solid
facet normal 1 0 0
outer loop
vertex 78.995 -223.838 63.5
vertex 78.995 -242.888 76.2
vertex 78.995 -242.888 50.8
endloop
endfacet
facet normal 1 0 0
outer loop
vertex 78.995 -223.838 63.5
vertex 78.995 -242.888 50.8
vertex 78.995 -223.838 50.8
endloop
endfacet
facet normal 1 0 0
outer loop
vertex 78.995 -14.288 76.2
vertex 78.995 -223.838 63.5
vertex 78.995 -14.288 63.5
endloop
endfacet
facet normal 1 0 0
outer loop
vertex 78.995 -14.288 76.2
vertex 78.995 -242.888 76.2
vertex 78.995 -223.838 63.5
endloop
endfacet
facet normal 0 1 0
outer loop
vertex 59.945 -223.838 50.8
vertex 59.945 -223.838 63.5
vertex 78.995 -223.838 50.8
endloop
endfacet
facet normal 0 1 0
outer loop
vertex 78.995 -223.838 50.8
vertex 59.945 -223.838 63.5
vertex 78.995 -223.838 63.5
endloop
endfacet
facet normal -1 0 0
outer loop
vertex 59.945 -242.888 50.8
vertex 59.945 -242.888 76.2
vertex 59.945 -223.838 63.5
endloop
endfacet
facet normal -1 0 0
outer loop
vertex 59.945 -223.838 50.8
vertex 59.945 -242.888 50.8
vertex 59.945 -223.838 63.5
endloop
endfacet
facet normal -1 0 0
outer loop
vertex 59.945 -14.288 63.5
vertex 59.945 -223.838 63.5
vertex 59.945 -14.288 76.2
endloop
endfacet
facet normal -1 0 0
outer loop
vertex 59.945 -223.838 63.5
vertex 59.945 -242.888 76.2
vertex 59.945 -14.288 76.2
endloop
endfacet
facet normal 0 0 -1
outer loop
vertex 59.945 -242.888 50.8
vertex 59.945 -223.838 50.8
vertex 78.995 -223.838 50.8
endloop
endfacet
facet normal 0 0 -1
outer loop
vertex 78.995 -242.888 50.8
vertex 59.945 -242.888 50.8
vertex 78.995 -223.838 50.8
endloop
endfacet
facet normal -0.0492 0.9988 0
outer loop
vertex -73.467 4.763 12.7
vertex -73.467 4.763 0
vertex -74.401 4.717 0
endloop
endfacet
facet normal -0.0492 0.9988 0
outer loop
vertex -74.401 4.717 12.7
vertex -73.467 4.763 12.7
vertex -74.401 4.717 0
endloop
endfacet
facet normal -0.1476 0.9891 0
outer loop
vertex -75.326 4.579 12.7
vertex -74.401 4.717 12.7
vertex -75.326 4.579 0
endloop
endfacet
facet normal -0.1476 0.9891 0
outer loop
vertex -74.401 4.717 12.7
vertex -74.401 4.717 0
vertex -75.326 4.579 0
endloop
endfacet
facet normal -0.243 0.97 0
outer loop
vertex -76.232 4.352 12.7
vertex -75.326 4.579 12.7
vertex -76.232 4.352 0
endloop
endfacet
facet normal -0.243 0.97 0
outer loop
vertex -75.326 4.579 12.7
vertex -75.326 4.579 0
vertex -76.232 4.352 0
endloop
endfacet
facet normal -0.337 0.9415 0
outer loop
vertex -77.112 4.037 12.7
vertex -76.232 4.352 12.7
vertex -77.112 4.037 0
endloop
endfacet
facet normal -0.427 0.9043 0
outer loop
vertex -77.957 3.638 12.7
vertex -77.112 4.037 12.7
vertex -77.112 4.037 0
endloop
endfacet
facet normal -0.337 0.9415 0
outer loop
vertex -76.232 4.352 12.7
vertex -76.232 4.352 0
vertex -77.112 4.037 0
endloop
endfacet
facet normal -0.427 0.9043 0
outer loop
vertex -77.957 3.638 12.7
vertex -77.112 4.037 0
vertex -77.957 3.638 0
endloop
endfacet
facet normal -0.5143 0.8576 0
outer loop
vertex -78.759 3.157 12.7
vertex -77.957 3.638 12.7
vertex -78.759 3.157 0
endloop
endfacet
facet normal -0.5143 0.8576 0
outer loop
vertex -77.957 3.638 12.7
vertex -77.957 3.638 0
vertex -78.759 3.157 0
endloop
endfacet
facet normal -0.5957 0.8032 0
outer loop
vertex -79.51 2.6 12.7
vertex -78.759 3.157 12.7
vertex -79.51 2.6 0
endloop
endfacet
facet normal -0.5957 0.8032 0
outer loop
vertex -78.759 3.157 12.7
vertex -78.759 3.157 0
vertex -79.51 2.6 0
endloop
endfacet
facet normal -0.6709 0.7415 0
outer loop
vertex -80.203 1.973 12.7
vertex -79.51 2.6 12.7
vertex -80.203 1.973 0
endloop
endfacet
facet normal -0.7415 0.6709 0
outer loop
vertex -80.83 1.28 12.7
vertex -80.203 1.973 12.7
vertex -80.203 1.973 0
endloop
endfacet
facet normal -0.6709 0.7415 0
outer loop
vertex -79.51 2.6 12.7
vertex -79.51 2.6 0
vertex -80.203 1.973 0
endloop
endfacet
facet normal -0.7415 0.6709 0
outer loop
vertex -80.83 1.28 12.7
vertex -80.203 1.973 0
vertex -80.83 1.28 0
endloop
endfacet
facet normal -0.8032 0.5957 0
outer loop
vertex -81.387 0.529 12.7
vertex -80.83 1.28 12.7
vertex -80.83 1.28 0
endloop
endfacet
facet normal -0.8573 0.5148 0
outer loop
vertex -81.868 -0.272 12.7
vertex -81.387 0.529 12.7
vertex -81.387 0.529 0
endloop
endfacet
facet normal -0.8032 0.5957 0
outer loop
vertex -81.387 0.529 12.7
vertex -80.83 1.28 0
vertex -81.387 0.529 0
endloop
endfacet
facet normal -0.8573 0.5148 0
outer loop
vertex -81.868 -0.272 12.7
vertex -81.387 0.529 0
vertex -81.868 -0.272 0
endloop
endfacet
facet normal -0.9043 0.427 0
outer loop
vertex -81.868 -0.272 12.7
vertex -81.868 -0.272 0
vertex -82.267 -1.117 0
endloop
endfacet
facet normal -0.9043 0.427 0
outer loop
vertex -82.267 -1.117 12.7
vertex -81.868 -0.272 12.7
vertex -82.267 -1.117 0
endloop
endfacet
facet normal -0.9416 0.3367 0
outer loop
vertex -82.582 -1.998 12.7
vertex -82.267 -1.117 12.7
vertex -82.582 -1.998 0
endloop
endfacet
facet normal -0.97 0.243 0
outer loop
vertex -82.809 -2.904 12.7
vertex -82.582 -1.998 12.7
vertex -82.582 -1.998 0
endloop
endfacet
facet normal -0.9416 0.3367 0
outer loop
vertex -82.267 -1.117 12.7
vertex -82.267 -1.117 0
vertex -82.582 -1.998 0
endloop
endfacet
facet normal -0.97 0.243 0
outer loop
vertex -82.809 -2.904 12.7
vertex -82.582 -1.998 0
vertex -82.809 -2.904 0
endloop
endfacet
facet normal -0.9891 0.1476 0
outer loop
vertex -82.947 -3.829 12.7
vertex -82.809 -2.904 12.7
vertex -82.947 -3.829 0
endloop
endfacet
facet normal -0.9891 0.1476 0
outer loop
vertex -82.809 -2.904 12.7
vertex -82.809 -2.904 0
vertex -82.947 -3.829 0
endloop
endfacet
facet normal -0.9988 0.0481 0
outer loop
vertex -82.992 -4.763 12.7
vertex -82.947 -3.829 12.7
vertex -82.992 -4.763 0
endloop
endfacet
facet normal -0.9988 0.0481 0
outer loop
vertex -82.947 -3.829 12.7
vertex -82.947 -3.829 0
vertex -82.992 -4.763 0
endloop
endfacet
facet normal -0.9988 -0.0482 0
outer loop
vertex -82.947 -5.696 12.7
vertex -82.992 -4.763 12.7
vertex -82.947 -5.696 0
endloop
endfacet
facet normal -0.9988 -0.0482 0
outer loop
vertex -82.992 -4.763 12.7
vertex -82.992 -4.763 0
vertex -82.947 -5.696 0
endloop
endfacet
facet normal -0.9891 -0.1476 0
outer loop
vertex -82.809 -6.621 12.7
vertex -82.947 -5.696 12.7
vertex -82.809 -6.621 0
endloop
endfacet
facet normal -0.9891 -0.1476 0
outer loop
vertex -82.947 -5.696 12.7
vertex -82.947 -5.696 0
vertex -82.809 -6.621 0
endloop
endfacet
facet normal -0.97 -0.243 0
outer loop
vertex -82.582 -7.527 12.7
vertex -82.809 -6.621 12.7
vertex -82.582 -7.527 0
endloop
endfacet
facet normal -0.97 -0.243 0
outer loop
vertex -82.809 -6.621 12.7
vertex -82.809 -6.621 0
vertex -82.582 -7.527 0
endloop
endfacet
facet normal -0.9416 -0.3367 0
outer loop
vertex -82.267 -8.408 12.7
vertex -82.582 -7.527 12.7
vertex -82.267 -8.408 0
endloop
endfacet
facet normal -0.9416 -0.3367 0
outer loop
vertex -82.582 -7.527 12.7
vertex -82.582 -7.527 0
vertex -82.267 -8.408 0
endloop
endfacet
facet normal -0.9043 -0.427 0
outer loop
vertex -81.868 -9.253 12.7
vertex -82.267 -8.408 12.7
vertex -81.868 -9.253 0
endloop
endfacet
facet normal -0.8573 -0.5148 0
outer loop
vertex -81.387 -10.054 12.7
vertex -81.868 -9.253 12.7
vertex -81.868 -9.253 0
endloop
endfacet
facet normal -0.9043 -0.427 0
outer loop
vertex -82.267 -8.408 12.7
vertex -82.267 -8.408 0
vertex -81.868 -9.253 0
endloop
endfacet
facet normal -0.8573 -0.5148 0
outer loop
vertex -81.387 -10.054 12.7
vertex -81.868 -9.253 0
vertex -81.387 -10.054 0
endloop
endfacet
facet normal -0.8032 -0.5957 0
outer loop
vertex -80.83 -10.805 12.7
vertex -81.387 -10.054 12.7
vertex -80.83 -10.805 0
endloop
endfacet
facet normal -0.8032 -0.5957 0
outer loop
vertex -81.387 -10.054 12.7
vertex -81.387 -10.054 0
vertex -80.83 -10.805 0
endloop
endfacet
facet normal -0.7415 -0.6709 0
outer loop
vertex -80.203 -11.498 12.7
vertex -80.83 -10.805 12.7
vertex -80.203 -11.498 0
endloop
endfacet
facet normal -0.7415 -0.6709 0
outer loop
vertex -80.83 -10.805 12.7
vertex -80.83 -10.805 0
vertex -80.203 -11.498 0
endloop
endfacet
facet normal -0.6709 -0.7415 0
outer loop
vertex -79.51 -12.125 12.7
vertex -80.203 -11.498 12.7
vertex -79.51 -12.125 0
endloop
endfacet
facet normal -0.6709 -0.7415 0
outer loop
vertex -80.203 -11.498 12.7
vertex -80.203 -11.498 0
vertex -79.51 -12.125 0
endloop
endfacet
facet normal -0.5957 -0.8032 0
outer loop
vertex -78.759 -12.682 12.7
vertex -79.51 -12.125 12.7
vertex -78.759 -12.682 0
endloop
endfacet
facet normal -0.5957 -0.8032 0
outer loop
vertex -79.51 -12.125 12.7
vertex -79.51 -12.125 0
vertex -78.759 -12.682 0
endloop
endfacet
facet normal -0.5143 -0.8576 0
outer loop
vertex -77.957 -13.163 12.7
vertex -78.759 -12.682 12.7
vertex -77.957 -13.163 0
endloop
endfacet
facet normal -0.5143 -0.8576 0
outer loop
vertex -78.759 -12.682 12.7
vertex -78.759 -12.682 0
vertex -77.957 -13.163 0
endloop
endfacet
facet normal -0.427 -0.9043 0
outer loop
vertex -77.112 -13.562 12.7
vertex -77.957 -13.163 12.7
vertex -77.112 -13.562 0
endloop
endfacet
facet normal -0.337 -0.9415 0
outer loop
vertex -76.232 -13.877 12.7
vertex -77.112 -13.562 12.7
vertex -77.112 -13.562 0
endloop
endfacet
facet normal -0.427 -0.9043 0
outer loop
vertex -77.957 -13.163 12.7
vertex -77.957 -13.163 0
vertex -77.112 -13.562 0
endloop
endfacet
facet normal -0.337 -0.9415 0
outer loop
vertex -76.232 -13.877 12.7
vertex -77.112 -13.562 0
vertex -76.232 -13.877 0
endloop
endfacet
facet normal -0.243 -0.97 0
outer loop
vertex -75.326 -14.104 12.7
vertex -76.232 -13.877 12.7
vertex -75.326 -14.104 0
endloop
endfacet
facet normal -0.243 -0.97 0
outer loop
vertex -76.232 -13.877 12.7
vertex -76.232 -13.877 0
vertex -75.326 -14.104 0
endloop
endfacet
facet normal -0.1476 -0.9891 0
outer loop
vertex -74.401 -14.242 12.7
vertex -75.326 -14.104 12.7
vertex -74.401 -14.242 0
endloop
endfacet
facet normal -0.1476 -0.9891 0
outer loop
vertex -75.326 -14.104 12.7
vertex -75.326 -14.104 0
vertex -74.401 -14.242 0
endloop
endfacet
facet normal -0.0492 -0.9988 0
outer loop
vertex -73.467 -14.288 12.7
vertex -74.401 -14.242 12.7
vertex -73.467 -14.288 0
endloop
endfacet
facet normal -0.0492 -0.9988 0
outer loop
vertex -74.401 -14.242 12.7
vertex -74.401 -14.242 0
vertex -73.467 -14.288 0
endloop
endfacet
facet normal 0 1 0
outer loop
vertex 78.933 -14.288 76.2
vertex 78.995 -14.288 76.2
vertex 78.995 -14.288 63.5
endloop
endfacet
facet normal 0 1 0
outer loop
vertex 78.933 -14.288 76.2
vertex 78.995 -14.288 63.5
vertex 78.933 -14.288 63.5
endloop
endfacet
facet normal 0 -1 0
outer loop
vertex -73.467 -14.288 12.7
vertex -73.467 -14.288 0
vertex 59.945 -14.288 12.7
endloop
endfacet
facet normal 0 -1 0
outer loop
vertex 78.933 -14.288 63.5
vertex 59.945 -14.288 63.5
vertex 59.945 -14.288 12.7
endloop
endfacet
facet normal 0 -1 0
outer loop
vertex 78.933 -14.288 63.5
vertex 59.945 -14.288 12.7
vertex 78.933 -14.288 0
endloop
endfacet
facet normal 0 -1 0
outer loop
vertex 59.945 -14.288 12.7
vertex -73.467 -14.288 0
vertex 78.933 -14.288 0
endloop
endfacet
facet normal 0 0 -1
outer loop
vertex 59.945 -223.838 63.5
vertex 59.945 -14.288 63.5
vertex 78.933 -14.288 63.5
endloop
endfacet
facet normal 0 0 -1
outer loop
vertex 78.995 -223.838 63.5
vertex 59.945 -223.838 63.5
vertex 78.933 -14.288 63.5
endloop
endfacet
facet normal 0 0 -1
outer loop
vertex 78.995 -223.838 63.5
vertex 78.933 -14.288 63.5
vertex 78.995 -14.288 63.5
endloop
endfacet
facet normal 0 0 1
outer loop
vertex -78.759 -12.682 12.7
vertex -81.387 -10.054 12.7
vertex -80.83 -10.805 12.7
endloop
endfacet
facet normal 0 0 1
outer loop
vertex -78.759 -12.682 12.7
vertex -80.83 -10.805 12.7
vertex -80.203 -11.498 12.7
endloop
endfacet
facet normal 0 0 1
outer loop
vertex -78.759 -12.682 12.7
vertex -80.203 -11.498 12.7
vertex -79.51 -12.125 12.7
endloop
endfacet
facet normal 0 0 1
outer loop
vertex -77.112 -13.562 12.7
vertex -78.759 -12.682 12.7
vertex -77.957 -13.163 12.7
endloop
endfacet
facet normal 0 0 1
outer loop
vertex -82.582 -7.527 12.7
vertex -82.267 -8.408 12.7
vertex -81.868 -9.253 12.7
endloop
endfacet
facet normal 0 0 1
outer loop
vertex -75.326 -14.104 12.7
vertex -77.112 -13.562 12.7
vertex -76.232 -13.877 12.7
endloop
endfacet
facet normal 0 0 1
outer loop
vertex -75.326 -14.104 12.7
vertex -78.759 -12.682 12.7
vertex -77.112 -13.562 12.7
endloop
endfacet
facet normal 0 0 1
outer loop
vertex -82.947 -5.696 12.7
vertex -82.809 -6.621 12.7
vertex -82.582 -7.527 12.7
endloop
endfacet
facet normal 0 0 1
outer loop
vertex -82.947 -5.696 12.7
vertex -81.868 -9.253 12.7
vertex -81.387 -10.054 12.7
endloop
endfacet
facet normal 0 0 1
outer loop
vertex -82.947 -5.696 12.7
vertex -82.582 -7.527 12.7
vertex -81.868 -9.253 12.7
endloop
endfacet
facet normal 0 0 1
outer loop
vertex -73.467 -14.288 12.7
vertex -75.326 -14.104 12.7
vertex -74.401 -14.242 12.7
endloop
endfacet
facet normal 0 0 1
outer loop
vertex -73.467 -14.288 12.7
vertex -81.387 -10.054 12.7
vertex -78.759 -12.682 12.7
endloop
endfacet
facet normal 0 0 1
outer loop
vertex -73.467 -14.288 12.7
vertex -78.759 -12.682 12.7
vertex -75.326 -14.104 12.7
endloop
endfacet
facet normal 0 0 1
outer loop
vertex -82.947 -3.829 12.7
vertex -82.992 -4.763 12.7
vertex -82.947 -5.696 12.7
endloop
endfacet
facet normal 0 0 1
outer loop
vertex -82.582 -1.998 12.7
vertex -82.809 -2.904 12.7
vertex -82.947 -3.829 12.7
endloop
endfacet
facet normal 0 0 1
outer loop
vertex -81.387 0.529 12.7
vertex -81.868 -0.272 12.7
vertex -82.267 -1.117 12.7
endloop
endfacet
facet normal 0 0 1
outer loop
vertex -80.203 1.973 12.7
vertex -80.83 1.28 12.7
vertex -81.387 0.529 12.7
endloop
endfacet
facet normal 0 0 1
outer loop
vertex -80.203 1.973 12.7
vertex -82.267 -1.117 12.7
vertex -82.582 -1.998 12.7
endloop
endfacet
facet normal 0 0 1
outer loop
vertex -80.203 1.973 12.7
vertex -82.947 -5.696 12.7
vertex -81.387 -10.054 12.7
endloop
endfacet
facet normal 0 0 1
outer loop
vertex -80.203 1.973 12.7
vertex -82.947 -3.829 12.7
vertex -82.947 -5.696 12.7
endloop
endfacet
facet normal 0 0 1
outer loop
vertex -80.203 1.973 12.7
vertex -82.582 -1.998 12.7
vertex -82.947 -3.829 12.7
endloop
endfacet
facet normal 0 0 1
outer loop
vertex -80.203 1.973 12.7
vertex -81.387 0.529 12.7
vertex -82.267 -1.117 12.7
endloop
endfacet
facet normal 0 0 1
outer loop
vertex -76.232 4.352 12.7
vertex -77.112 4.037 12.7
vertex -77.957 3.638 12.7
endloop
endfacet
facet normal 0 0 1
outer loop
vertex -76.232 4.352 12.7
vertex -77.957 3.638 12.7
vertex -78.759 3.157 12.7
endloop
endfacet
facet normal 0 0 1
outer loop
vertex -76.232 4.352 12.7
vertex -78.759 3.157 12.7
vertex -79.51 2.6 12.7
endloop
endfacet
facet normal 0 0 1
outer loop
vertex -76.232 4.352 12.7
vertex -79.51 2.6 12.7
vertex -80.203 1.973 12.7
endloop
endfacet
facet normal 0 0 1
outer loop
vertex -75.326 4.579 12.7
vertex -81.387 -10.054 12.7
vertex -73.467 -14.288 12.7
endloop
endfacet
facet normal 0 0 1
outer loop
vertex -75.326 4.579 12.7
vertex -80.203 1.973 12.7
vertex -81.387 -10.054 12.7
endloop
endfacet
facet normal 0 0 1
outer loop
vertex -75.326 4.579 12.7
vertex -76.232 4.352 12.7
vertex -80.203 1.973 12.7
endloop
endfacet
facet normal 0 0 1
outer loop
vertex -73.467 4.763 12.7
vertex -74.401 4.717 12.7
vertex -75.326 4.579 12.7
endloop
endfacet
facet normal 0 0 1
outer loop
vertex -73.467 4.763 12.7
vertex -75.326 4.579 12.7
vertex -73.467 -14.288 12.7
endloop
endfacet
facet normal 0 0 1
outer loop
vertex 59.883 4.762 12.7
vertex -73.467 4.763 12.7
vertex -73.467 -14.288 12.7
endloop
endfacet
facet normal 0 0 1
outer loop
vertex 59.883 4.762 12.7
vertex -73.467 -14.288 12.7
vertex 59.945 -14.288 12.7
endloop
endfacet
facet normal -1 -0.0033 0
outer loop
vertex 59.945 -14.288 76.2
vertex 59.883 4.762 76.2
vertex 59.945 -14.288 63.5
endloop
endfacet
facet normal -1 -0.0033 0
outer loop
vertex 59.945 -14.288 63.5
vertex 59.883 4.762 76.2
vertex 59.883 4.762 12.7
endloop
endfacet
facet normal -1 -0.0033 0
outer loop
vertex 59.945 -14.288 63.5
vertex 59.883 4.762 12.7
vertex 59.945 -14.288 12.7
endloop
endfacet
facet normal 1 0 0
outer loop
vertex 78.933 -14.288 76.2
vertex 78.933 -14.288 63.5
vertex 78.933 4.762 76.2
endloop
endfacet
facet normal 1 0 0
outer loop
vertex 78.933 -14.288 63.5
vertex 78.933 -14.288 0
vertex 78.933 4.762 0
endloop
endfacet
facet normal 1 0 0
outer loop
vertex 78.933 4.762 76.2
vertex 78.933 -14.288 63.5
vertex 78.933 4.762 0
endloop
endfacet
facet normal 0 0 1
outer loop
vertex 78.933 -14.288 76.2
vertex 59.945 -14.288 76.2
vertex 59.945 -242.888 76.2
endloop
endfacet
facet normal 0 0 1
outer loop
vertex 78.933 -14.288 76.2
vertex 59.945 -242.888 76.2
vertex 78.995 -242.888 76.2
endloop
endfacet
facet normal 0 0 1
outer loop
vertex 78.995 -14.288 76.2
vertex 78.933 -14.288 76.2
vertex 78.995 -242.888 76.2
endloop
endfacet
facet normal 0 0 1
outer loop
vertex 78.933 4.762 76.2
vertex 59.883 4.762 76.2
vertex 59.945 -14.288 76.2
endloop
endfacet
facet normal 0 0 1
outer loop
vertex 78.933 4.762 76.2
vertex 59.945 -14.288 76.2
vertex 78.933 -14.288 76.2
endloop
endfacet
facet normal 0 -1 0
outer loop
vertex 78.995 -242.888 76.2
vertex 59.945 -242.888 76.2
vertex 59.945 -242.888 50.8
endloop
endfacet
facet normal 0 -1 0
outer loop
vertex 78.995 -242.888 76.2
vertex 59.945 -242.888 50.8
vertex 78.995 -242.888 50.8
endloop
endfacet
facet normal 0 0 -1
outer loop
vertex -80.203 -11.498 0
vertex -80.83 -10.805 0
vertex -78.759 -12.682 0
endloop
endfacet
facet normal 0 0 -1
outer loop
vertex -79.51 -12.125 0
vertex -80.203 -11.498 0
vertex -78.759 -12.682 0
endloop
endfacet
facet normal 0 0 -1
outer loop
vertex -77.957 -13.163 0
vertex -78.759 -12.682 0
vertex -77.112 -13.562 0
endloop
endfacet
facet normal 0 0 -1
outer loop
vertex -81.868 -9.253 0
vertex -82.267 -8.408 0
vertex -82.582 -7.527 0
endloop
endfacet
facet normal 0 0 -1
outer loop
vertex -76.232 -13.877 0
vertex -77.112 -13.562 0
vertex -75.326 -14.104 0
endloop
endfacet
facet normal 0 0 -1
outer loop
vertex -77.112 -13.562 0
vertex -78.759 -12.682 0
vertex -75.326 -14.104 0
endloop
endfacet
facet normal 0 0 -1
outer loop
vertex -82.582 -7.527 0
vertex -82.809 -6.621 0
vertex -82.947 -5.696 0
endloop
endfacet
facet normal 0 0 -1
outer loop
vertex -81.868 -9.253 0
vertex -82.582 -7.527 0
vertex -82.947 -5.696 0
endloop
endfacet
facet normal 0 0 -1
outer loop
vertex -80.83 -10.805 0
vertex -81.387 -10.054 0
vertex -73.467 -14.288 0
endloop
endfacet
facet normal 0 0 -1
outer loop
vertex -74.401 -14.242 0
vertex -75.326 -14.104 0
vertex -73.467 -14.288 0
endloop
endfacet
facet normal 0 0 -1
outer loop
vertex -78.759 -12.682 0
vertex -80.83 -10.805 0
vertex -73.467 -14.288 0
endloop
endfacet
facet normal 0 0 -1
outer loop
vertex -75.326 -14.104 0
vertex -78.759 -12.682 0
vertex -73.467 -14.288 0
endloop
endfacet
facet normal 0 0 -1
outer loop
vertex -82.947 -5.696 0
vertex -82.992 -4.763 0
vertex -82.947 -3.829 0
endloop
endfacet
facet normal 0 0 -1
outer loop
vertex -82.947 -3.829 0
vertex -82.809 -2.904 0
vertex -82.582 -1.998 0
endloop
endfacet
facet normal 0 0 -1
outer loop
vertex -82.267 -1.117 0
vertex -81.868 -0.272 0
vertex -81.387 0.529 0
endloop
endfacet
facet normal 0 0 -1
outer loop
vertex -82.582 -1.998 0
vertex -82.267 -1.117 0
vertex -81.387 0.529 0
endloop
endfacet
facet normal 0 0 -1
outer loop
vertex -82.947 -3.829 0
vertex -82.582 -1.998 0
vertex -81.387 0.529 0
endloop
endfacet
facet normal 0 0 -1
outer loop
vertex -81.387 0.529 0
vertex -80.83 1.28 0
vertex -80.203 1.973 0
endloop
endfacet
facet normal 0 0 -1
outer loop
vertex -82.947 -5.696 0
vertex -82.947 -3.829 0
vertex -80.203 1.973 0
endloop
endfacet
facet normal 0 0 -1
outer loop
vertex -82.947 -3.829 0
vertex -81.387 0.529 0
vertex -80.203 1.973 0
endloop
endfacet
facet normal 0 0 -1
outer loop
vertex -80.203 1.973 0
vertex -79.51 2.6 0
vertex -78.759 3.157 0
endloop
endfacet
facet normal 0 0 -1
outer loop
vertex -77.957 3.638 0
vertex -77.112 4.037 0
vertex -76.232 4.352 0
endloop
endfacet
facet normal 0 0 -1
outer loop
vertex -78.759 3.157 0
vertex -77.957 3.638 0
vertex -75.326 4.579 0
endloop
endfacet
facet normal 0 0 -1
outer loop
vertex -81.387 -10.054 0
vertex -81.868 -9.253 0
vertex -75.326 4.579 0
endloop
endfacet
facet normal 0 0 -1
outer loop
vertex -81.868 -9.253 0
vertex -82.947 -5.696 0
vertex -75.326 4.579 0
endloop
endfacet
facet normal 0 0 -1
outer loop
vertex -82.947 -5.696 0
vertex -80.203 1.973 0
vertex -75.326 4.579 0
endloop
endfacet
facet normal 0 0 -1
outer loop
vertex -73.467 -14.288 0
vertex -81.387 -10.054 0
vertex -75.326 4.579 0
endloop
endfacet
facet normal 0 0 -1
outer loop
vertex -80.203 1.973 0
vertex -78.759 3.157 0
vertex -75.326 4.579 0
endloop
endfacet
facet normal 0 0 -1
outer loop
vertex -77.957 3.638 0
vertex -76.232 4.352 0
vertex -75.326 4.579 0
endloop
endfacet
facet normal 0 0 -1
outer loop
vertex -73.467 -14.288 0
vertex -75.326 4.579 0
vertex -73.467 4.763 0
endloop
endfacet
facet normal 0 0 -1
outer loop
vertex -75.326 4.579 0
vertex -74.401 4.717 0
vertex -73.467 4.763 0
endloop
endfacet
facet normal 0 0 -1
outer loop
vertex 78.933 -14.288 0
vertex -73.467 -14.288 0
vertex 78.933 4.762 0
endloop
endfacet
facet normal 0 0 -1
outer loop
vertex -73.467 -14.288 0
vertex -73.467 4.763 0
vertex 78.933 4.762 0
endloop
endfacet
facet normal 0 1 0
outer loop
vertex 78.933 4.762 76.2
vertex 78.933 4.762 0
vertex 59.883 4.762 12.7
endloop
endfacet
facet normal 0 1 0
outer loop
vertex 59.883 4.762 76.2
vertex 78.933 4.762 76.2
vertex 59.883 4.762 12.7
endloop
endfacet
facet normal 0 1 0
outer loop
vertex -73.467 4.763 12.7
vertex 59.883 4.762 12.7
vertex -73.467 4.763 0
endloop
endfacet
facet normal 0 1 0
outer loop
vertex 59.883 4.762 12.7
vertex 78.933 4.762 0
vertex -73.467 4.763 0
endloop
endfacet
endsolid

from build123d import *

# Parameters (mm, degrees)
F1_DEPTH = 12.7
F2_DEPTH = 76.2
F4_DEPTH = 12.7
F3_W     = 19.05
F3_H     = 19.05
F5_DEPTH = 25.4


# Not quite as in the source:
# - a feature names something its author has since deleted; it is built from what else it names


with BuildPart() as f1:
    # F0 (on Top) → F1 (new body)
    with BuildSketch(Plane.XY):
        with BuildLine():
            Line((59.8826112453, 4.7625), (-73.4673887547, 4.7625))
            ThreePointArc((-73.4673887547, 4.7625), (-82.9923886673, -4.7625000437), (-73.4673886673, -14.2875))
            Line((-73.4673886673, -14.2875), (59.9451471992, -14.2875))
            Line((59.9451471992, -14.2875), (59.8826112453, 4.7625))
        make_face()
        Polygon((78.9326112453, 4.7625), (59.8826112453, 4.7625), (59.9451471992, -14.2875), (78.9326113327, -14.2875), align=None)
    extrude(amount=F1_DEPTH)

    # F0 (on Top) → F2 (join)
    with BuildSketch(Plane.XY):
        Polygon((78.9326112453, 4.7625), (59.8826112453, 4.7625), (59.9451471992, -14.2875), (78.9326113327, -14.2875), align=None)
    extrude(amount=F2_DEPTH)

    # F3 (on face) → F4 (join)
    with BuildSketch(Plane.XY.offset(76.2)):
        Polygon((78.9326113327, -14.2875), (59.9451471992, -14.2875), (59.9451471992, -223.8375), (78.9951471992, -223.8375), (78.9951471992, -14.2875), align=None)
    extrude(amount=-F4_DEPTH)

    # F3 (on face) → F5 (join)
    with BuildSketch(Plane.XY.offset(76.2)):
        with Locations((69.4701471992, -233.3625)):
            Rectangle(F3_W, F3_H)
    extrude(amount=-F5_DEPTH)


with BuildPart() as f6_1:
    # F6: copy of F1
    add(f1.part)


solid = f1.part
